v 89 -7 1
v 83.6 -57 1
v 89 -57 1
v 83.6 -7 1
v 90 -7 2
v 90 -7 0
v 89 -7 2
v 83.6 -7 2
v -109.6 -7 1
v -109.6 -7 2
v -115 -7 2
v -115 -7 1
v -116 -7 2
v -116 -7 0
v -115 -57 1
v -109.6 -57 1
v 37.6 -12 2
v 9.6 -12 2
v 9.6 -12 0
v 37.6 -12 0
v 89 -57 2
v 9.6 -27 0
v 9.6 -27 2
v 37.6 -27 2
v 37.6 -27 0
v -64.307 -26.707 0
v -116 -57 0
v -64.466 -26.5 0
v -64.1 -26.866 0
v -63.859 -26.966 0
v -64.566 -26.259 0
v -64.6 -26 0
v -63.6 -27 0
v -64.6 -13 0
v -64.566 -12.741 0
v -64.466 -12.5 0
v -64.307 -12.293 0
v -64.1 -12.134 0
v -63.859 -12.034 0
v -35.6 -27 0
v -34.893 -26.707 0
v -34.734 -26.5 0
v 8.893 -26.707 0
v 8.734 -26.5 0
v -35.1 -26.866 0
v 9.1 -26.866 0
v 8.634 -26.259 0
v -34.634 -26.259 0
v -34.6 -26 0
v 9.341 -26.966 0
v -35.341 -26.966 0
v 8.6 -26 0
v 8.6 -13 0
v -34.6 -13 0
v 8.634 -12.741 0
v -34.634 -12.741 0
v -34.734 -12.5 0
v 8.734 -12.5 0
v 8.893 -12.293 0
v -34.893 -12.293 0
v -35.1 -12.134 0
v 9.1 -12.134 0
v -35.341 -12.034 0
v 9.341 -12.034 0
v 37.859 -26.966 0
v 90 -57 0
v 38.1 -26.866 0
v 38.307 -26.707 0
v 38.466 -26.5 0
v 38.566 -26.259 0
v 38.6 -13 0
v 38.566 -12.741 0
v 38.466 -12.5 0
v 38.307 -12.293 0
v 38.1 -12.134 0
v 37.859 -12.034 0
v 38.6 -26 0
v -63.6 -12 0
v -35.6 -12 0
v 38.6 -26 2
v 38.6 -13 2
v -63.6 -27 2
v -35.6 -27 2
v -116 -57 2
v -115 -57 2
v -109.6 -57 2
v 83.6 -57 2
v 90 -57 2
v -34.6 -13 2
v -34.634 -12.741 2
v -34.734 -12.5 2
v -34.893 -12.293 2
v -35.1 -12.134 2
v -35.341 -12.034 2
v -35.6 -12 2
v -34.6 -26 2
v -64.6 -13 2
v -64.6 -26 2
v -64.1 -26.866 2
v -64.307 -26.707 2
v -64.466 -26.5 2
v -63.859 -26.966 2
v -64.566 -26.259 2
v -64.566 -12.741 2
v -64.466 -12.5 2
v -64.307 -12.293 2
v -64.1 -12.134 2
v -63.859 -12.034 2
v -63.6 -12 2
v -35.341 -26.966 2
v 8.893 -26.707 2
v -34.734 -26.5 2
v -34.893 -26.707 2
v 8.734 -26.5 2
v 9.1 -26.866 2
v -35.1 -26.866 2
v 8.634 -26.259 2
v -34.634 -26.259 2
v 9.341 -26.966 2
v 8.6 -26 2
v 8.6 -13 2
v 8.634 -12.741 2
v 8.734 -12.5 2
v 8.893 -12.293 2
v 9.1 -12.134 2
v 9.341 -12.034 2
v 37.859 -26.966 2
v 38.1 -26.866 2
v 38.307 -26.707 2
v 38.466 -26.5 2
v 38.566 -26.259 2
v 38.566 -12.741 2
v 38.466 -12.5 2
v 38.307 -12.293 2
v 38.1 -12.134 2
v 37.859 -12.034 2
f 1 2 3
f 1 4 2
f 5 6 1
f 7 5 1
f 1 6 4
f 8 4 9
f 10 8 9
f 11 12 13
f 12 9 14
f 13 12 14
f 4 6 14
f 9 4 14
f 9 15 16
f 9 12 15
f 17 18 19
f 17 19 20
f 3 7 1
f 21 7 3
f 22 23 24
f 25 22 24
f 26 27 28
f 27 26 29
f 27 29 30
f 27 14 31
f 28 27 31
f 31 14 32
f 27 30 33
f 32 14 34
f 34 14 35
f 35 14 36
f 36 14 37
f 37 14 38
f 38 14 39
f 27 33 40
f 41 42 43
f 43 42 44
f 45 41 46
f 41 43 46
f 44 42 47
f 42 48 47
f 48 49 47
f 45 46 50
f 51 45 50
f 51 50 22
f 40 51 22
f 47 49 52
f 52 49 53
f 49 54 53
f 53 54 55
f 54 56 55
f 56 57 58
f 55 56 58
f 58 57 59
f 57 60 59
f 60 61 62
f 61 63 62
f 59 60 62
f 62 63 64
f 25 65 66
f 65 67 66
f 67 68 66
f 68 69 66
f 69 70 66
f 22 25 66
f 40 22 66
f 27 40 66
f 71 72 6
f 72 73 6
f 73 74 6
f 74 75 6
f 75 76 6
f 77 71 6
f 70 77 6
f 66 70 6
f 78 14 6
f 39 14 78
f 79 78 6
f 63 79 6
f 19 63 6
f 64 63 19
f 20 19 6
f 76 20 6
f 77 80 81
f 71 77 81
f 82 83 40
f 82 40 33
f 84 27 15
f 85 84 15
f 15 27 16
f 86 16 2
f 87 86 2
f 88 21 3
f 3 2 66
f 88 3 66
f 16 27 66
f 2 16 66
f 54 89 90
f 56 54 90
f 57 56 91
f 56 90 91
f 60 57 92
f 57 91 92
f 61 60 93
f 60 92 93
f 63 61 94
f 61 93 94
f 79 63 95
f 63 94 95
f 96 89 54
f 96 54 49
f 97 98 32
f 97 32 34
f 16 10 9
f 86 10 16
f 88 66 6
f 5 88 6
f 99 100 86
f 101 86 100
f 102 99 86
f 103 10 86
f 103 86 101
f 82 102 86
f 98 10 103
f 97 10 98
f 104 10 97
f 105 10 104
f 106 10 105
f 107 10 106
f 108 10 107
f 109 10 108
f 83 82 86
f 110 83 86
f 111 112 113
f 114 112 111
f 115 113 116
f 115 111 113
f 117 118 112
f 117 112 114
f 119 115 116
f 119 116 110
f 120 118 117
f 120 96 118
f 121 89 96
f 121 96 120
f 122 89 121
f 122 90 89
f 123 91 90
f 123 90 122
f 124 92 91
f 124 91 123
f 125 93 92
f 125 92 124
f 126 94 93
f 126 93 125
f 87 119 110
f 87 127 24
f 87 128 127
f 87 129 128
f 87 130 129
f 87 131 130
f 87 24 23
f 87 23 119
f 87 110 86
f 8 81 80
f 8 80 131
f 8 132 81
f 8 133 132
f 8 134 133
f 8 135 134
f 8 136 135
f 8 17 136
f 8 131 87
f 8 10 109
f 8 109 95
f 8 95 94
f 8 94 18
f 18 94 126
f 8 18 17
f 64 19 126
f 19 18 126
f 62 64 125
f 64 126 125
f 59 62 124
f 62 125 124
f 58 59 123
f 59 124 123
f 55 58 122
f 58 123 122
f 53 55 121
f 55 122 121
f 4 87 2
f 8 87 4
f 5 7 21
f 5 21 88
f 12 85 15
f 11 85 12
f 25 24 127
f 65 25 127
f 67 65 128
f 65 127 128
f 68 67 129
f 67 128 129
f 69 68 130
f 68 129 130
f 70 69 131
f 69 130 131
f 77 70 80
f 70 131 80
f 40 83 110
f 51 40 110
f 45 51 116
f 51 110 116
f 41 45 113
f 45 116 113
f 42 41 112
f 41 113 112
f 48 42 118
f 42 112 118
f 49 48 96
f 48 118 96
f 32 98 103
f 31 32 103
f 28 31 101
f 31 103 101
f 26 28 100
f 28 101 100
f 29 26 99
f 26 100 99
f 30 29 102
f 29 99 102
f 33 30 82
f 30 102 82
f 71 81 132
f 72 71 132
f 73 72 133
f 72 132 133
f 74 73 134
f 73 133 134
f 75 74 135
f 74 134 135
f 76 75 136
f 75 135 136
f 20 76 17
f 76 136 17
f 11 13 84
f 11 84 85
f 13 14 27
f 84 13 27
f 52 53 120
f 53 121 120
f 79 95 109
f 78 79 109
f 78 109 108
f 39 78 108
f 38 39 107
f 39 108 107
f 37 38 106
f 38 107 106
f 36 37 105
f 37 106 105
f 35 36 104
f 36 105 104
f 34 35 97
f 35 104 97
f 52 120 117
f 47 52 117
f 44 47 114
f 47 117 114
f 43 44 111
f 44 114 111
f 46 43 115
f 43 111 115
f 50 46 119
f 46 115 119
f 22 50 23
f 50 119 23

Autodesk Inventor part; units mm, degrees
ref_plane "YZ Plane" through (0, 0, 0) normal (1, 0, 0) x (0, 1, 0)
ref_plane "XZ Plane" through (0, 0, 0) normal (0, 1, 0) x (-1, 0, 0)
ref_plane "XY Plane" through (0, 0, 0) normal (0, 0, 1) x (1, 0, 0)
sketch "스케치1" plane through (0, 0, 0) normal (0, 0, 1) x (1, 0, 0)
  line L0 (90, -7) -> (-116, -7)
  line L1 (-116, -7) -> (-116, -57)
  line L2 (-116, -57) -> (90, -57)
  line L3 (90, -57) -> (90, -7)
  point P0 (0, 0)
  dimension "d0" = 50
  dimension "d3" = 206
extrude "돌출1" add sketch "스케치1" along normal blind 2
sketch "스케치2" plane through (0, 0, 2) normal (0, 0, 1) x (1, 0, 0)
  line L0 (90, -7) -> (-116, -7) projected
  line L1 (-115, -7) -> (-109.6, -7)
  line L2 (-109.6, -7) -> (-109.6, -57.0095)
  line L3 (-109.6, -57.0095) -> (-115, -57.0095)
  line L4 (-115, -57.0095) -> (-115, -7)
  line L5 (-116, -7) -> (-116, -57) projected
  line L6 (-116, -57) -> (90, -57) projected
  line L7 (83.6, -7) -> (89, -7)
  line L8 (89, -7) -> (89, -57)
  line L9 (89, -57) -> (83.6, -57)
  line L10 (83.6, -57) -> (83.6, -7)
  line L11 (90, -57) -> (90, -7) projected
  point P0 (0, 0)
  dimension "d4" = 5.4
  dimension "d5" = 1
  dimension "d6" = 5.4
  dimension "d7" = 1
extrude "돌출2" cut sketch "스케치2" against normal blind 1 contours L8 L6 L10 L0 | L2 L6 L4 L0 | L2 L3 L4 L6
sketch "스케치3" plane through (0, 0, 2) normal (0, 0, 1) x (1, 0, 0)
  line L0 (83.6, -57) -> (83.6, -7) projected
  line L1 (83.6, -7) -> (-109.6, -7) projected
  line L2 (-109.6, -7) -> (-109.6, -57) projected
  line L3 (-109.6, -57) -> (83.6, -57) projected
  line L4 (-109.6, -29.3333) -> (-64.6, -29.3333)
  line L5 (83.6, -24) -> (38.6, -24)
  line L6 (90, -7) -> (-116, -7) projected
  line L7 (-13, -7) -> (-13, -12)
  line L8 (-13, -12) -> (-63.6, -12)
  line L9 (-109.6, -7) -> (-109.6, -57) projected
  line L10 (9.6, -12) -> (37.6, -12)
  line L11 (38.6, -26) -> (38.6, -13)
  line L12 (-64.6, -26) -> (-64.6, -13)
  line L13 (37.6, -12) -> (9.6, -12)
  line L14 (8.6, -13) -> (8.6, -26)
  line L15 (9.6, -27) -> (37.6, -27)
  line L16 (38.6, -26) -> (38.6, -13)
  line L17 (-63.6, -12) -> (-35.6, -12)
  line L18 (-34.6, -13) -> (-34.6, -26)
  line L19 (-35.6, -27) -> (-63.6, -27)
  line L20 (-64.6, -26) -> (-64.6, -13)
  arc A0 (-34.6, -13) -> (-35.6, -12) centre (-35.6, -13) ccw
  arc A1 (-35.6, -27) -> (-34.6, -26) centre (-35.6, -26) ccw
  arc A2 (-64.6, -26) -> (-63.6, -27) centre (-63.6, -26) ccw
  arc A3 (-63.6, -12) -> (-64.6, -13) centre (-63.6, -13) ccw
  arc A4 (9.6, -12) -> (8.6, -13) centre (9.6, -13) ccw
  arc A5 (38.6, -13) -> (37.6, -12) centre (37.6, -13) ccw
  arc A6 (37.6, -27) -> (38.6, -26) centre (37.6, -26) ccw
  arc A7 (8.6, -26) -> (9.6, -27) centre (9.6, -26) ccw
  point P0 (0, 0)
  point P1 (83.6, -12)
  point P2 (38.6, -12)
  point P3 (-64.6, -12)
  point P4 (8.6, -27)
  point P5 (8.6, -12)
  point P6 (38.6, -27)
  point P7 (-34.6, -27)
  point P8 (-34.6, -12)
  point P9 (-64.6, -27)
  dimension "d10" = 45
  dimension "d11" = 45
  dimension "d12" = 5
  dimension "d13" = 30
  dimension "d14" = 15
  dimension "d15" = 30
  dimension "d16" = 15
  dimension "d19" = 1
extrude "돌출3" cut sketch "스케치3" against normal blind 10 contours L11 A6 L15 A7 L14 A4 L10 A5 | A0 L18 A1 L19 A2 L12 A3 L8
properties part number "뒷판" material "알루미늄 6061"
